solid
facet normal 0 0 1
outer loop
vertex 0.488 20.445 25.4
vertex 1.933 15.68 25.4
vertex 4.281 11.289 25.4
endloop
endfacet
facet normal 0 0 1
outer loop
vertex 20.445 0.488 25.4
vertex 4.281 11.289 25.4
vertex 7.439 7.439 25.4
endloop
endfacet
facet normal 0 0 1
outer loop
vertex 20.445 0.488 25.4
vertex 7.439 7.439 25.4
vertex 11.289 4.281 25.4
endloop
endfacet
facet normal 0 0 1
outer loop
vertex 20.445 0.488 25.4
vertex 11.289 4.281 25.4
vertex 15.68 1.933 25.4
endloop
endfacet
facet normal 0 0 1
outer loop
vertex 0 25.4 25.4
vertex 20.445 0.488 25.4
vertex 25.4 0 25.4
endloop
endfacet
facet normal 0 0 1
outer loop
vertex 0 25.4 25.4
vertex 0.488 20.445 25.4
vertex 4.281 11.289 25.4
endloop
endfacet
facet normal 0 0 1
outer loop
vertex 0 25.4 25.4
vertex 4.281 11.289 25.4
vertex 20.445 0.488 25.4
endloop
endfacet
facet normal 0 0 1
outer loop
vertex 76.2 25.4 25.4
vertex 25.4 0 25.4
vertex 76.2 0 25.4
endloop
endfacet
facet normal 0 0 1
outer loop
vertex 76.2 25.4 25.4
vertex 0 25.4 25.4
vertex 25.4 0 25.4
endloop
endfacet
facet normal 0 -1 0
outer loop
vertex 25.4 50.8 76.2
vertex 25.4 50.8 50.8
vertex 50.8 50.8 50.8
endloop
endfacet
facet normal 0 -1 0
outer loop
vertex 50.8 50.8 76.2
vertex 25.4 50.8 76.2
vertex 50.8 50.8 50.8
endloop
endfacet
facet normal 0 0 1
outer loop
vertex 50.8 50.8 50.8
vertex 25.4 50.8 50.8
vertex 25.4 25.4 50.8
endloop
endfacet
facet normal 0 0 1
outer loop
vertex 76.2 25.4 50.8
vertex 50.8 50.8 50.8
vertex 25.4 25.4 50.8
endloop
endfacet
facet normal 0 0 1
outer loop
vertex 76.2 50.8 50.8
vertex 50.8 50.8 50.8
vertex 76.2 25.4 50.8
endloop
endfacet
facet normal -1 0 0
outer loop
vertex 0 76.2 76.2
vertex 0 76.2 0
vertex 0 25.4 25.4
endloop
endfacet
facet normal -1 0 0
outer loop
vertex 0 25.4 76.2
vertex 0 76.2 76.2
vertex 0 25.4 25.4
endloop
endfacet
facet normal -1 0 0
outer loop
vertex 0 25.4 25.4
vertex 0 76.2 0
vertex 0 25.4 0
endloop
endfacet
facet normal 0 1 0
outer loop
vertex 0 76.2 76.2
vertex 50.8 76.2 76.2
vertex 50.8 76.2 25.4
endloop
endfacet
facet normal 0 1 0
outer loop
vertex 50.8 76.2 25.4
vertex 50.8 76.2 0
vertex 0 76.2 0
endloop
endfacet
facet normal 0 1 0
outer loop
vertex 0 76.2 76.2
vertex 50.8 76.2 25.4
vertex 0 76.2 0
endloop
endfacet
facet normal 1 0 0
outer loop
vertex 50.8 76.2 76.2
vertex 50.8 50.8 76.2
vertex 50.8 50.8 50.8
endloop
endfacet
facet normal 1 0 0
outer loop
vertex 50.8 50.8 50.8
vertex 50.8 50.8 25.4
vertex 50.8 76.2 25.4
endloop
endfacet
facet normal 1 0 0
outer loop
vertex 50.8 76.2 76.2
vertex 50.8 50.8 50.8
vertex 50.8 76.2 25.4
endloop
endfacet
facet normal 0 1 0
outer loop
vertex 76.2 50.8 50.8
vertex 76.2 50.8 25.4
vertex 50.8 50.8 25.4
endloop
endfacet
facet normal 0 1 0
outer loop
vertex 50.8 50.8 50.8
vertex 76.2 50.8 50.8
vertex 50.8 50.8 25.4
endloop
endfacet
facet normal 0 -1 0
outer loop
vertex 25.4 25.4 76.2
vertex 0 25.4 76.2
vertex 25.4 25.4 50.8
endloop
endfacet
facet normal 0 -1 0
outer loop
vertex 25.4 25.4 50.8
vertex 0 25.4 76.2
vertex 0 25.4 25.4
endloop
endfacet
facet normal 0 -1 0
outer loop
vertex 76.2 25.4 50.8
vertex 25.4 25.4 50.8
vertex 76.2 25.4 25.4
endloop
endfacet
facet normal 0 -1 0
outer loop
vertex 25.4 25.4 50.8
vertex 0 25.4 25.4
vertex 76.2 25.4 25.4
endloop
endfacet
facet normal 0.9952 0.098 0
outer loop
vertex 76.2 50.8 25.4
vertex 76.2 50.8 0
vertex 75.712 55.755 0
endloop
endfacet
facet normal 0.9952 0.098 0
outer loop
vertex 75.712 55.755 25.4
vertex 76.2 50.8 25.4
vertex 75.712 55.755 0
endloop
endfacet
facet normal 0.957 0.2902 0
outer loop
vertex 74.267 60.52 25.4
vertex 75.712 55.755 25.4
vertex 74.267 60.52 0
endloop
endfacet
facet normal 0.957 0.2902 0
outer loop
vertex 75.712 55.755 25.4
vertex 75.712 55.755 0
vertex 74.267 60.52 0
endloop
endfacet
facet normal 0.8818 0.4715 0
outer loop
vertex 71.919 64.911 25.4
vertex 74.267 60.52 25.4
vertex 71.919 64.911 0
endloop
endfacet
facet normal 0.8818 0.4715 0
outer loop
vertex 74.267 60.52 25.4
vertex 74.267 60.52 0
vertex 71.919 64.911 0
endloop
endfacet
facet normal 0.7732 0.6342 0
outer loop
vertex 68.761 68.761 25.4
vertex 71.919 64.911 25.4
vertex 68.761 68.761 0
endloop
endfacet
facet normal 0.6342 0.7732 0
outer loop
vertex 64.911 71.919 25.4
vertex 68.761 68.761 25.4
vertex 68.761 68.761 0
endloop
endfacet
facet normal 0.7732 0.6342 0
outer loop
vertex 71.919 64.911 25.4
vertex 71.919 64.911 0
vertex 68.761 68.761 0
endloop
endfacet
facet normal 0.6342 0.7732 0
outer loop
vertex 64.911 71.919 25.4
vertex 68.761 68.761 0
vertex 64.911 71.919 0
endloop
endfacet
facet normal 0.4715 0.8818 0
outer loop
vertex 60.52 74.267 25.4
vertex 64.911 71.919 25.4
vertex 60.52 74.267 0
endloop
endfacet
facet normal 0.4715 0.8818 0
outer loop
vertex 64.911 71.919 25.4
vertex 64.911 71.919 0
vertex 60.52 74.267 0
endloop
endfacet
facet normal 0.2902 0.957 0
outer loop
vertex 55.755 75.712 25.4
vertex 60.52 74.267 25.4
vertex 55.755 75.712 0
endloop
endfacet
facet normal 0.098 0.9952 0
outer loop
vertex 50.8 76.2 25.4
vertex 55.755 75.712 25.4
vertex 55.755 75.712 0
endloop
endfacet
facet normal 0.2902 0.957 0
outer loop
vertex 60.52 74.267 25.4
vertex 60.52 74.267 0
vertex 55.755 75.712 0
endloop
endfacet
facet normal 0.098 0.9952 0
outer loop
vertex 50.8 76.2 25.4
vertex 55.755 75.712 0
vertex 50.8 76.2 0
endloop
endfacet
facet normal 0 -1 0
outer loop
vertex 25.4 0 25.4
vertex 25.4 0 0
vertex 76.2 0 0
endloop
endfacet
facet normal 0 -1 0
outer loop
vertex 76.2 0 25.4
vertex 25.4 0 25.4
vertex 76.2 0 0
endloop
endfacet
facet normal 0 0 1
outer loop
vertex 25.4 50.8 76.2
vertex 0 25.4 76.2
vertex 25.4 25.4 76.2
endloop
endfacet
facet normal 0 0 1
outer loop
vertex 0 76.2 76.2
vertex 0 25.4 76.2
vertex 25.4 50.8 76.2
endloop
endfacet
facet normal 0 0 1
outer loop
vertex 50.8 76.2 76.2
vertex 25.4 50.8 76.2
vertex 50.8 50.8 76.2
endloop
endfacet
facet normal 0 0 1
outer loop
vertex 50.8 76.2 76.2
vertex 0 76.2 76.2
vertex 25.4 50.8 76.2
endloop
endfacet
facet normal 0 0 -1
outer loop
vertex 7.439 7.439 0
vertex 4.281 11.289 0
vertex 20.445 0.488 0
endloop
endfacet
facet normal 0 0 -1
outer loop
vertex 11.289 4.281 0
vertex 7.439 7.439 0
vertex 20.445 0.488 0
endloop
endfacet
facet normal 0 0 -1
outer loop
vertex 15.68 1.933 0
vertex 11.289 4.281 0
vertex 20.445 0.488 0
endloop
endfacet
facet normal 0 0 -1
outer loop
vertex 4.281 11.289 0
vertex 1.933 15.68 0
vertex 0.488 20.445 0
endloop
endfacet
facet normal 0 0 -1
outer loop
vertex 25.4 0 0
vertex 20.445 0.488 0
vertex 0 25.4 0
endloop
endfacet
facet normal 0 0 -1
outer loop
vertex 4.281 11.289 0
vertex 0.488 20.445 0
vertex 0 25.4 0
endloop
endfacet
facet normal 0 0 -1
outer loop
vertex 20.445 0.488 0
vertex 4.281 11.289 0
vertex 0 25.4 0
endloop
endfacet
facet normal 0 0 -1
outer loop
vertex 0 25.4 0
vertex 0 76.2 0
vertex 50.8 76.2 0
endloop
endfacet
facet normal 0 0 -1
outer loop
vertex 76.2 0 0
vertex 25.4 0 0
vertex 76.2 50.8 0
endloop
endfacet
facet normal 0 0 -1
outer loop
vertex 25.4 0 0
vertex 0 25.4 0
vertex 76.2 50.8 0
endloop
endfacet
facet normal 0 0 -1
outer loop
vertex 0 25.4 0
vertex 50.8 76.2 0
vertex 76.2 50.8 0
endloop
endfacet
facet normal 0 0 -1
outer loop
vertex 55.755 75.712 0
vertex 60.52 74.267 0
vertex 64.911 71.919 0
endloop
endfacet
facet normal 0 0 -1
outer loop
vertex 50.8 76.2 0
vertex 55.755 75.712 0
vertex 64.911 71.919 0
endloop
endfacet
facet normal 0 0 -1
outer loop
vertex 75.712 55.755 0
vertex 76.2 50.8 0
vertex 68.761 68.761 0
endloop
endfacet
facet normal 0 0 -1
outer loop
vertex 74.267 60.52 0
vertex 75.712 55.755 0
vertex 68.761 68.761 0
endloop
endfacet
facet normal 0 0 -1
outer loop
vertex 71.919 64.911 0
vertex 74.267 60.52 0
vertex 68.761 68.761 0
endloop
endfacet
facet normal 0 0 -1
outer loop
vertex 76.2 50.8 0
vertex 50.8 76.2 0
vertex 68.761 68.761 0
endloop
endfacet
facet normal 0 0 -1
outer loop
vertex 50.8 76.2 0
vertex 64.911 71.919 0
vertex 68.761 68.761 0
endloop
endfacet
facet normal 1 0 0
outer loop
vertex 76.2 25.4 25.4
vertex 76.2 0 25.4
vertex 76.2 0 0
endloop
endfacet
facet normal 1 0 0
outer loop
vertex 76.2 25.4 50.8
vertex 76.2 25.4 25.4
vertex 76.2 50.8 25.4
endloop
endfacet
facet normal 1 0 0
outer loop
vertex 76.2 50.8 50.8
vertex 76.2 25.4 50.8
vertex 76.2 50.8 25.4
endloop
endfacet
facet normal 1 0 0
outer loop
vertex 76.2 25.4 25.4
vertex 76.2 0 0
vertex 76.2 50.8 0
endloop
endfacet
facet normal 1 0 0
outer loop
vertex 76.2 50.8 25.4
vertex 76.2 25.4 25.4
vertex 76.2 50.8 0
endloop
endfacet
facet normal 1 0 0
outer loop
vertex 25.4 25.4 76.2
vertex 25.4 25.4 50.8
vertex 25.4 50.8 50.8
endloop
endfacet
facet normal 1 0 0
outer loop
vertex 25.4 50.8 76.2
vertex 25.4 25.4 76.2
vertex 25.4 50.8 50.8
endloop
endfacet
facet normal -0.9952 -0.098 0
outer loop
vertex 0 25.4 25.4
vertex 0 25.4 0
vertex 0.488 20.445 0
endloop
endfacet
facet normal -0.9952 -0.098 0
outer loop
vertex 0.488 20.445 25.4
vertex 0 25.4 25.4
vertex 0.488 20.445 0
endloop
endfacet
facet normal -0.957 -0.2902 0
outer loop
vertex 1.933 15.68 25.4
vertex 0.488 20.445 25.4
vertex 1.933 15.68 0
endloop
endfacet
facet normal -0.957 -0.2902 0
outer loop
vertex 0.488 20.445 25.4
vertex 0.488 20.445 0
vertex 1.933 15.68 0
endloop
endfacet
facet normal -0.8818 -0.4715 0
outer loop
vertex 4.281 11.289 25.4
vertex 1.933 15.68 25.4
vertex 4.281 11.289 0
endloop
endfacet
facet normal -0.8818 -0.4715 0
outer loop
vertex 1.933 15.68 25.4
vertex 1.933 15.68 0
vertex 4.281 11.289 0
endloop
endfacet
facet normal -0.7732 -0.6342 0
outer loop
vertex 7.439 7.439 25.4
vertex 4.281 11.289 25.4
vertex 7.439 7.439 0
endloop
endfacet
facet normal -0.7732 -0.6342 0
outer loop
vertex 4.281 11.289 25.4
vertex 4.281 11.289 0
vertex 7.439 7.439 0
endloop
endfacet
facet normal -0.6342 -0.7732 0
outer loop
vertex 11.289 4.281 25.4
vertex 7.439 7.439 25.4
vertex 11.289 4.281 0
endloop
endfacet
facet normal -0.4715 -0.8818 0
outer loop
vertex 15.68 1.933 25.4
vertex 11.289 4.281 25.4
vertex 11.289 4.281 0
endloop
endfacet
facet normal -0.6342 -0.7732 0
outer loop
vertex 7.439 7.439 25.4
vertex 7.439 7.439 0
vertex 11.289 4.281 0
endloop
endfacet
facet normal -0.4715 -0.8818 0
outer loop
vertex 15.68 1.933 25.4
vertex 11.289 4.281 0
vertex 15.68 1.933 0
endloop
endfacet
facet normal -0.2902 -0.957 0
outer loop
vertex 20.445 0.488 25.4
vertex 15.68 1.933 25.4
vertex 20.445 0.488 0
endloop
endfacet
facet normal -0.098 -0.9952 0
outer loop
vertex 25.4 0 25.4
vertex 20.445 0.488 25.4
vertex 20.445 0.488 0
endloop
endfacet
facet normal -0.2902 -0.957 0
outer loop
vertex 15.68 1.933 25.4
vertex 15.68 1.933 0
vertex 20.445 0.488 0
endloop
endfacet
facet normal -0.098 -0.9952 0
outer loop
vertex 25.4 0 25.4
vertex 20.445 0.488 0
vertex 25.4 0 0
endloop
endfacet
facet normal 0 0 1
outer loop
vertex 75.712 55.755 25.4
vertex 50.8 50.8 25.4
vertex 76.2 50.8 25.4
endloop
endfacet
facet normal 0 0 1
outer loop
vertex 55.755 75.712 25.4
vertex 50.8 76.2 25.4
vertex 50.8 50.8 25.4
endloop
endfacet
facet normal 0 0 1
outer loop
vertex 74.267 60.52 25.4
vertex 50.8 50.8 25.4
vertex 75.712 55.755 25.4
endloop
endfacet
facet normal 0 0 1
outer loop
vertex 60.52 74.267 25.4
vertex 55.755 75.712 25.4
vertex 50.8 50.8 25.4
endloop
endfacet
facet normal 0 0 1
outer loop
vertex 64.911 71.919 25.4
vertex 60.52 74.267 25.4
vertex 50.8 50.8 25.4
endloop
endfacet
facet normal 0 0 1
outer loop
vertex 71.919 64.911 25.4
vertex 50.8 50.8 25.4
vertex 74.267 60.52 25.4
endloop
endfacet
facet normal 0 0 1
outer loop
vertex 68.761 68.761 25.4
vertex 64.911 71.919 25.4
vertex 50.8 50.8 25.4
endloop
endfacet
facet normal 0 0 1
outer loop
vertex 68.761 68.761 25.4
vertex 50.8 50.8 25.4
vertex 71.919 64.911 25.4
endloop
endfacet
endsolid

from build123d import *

# Parameters (mm, degrees)
F0_W     = 25.4
F0_H     = 25.4
F1_DEPTH = 76.2
F2_DEPTH = 50.8
F3_DEPTH = 25.4


with BuildPart() as f1:
    # F0 (on Top) → F1 (new body)
    with BuildSketch(Plane.XY):
        with Locations((12.7, 63.5)):
            Rectangle(F0_W, F0_H)
        with BuildLine():
            ThreePointArc((25.4, 50.8), (7.4394877579, 43.3605122421), (0, 25.4))
            Line((0, 25.4), (25.4, 25.4))
            Line((25.4, 25.4), (25.4, 50.8))
        make_face()
        with BuildLine():
            Line((0, 50.8), (0, 25.4))
            ThreePointArc((0, 25.4), (7.4394877579, 43.3605122421), (25.4, 50.8))
            Line((25.4, 50.8), (0, 50.8))
        make_face()
        with BuildLine():
            ThreePointArc((50.8, 76.2), (32.8394877579, 68.7605122421), (25.4, 50.8))
            Line((25.4, 50.8), (50.8, 50.8))
            Line((50.8, 50.8), (50.8, 76.2))
        make_face()
        with BuildLine():
            Line((25.4, 76.2), (25.4, 50.8))
            ThreePointArc((25.4, 50.8), (32.8394877579, 68.7605122421), (50.8, 76.2))
            Line((50.8, 76.2), (25.4, 76.2))
        make_face()
    extrude(amount=F1_DEPTH)

    # F0 (on Top) → F2 (join)
    with BuildSketch(Plane.XY):
        with BuildLine():
            ThreePointArc((25.4, 50.8), (43.3605122421, 43.3605122421), (50.8, 25.4))
            Line((50.8, 25.4), (50.8, 50.8))
            Line((50.8, 50.8), (25.4, 50.8))
        make_face()
        with BuildLine():
            ThreePointArc((25.4, 50.8), (32.8394877579, 32.8394877579), (50.8, 25.4))
            ThreePointArc((50.8, 25.4), (43.3605122421, 43.3605122421), (25.4, 50.8))
        make_face()
        with BuildLine():
            Line((25.4, 50.8), (25.4, 25.4))
            Line((25.4, 25.4), (50.8, 25.4))
            ThreePointArc((50.8, 25.4), (32.8394877579, 32.8394877579), (25.4, 50.8))
        make_face()
        with BuildLine():
            Line((50.8, 50.8), (50.8, 25.4))
            ThreePointArc((50.8, 25.4), (68.7605122421, 32.8394877579), (76.2, 50.8))
            Line((76.2, 50.8), (50.8, 50.8))
        make_face()
        with BuildLine():
            ThreePointArc((76.2, 50.8), (68.7605122421, 32.8394877579), (50.8, 25.4))
            Line((50.8, 25.4), (76.2, 25.4))
            Line((76.2, 25.4), (76.2, 50.8))
        make_face()
    extrude(amount=F2_DEPTH)

    # F0 (on Top) → F3 (join)
    with BuildSketch(Plane.XY):
        with Locations((63.5, 12.7)):
            Rectangle(F0_W, F0_H)
        with BuildLine():
            Line((25.4, 25.4), (25.4, 0))
            ThreePointArc((25.4, 0), (43.3605122421, 7.4394877579), (50.8, 25.4))
            Line((50.8, 25.4), (25.4, 25.4))
        make_face()
        with BuildLine():
            ThreePointArc((50.8, 25.4), (43.3605122421, 7.4394877579), (25.4, 0))
            Line((25.4, 0), (50.8, 0))
            Line((50.8, 0), (50.8, 25.4))
        make_face()
        with BuildLine():
            Line((50.8, 76.2), (50.8, 50.8))
            Line((50.8, 50.8), (76.2, 50.8))
            ThreePointArc((76.2, 50.8), (68.7605122421, 68.7605122421), (50.8, 76.2))
        make_face()
        with BuildLine():
            ThreePointArc((0, 25.4), (7.4394877579, 7.4394877579), (25.4, 0))
            Line((25.4, 0), (25.4, 25.4))
            Line((25.4, 25.4), (0, 25.4))
        make_face()
    extrude(amount=F3_DEPTH)


solid = f1.part
